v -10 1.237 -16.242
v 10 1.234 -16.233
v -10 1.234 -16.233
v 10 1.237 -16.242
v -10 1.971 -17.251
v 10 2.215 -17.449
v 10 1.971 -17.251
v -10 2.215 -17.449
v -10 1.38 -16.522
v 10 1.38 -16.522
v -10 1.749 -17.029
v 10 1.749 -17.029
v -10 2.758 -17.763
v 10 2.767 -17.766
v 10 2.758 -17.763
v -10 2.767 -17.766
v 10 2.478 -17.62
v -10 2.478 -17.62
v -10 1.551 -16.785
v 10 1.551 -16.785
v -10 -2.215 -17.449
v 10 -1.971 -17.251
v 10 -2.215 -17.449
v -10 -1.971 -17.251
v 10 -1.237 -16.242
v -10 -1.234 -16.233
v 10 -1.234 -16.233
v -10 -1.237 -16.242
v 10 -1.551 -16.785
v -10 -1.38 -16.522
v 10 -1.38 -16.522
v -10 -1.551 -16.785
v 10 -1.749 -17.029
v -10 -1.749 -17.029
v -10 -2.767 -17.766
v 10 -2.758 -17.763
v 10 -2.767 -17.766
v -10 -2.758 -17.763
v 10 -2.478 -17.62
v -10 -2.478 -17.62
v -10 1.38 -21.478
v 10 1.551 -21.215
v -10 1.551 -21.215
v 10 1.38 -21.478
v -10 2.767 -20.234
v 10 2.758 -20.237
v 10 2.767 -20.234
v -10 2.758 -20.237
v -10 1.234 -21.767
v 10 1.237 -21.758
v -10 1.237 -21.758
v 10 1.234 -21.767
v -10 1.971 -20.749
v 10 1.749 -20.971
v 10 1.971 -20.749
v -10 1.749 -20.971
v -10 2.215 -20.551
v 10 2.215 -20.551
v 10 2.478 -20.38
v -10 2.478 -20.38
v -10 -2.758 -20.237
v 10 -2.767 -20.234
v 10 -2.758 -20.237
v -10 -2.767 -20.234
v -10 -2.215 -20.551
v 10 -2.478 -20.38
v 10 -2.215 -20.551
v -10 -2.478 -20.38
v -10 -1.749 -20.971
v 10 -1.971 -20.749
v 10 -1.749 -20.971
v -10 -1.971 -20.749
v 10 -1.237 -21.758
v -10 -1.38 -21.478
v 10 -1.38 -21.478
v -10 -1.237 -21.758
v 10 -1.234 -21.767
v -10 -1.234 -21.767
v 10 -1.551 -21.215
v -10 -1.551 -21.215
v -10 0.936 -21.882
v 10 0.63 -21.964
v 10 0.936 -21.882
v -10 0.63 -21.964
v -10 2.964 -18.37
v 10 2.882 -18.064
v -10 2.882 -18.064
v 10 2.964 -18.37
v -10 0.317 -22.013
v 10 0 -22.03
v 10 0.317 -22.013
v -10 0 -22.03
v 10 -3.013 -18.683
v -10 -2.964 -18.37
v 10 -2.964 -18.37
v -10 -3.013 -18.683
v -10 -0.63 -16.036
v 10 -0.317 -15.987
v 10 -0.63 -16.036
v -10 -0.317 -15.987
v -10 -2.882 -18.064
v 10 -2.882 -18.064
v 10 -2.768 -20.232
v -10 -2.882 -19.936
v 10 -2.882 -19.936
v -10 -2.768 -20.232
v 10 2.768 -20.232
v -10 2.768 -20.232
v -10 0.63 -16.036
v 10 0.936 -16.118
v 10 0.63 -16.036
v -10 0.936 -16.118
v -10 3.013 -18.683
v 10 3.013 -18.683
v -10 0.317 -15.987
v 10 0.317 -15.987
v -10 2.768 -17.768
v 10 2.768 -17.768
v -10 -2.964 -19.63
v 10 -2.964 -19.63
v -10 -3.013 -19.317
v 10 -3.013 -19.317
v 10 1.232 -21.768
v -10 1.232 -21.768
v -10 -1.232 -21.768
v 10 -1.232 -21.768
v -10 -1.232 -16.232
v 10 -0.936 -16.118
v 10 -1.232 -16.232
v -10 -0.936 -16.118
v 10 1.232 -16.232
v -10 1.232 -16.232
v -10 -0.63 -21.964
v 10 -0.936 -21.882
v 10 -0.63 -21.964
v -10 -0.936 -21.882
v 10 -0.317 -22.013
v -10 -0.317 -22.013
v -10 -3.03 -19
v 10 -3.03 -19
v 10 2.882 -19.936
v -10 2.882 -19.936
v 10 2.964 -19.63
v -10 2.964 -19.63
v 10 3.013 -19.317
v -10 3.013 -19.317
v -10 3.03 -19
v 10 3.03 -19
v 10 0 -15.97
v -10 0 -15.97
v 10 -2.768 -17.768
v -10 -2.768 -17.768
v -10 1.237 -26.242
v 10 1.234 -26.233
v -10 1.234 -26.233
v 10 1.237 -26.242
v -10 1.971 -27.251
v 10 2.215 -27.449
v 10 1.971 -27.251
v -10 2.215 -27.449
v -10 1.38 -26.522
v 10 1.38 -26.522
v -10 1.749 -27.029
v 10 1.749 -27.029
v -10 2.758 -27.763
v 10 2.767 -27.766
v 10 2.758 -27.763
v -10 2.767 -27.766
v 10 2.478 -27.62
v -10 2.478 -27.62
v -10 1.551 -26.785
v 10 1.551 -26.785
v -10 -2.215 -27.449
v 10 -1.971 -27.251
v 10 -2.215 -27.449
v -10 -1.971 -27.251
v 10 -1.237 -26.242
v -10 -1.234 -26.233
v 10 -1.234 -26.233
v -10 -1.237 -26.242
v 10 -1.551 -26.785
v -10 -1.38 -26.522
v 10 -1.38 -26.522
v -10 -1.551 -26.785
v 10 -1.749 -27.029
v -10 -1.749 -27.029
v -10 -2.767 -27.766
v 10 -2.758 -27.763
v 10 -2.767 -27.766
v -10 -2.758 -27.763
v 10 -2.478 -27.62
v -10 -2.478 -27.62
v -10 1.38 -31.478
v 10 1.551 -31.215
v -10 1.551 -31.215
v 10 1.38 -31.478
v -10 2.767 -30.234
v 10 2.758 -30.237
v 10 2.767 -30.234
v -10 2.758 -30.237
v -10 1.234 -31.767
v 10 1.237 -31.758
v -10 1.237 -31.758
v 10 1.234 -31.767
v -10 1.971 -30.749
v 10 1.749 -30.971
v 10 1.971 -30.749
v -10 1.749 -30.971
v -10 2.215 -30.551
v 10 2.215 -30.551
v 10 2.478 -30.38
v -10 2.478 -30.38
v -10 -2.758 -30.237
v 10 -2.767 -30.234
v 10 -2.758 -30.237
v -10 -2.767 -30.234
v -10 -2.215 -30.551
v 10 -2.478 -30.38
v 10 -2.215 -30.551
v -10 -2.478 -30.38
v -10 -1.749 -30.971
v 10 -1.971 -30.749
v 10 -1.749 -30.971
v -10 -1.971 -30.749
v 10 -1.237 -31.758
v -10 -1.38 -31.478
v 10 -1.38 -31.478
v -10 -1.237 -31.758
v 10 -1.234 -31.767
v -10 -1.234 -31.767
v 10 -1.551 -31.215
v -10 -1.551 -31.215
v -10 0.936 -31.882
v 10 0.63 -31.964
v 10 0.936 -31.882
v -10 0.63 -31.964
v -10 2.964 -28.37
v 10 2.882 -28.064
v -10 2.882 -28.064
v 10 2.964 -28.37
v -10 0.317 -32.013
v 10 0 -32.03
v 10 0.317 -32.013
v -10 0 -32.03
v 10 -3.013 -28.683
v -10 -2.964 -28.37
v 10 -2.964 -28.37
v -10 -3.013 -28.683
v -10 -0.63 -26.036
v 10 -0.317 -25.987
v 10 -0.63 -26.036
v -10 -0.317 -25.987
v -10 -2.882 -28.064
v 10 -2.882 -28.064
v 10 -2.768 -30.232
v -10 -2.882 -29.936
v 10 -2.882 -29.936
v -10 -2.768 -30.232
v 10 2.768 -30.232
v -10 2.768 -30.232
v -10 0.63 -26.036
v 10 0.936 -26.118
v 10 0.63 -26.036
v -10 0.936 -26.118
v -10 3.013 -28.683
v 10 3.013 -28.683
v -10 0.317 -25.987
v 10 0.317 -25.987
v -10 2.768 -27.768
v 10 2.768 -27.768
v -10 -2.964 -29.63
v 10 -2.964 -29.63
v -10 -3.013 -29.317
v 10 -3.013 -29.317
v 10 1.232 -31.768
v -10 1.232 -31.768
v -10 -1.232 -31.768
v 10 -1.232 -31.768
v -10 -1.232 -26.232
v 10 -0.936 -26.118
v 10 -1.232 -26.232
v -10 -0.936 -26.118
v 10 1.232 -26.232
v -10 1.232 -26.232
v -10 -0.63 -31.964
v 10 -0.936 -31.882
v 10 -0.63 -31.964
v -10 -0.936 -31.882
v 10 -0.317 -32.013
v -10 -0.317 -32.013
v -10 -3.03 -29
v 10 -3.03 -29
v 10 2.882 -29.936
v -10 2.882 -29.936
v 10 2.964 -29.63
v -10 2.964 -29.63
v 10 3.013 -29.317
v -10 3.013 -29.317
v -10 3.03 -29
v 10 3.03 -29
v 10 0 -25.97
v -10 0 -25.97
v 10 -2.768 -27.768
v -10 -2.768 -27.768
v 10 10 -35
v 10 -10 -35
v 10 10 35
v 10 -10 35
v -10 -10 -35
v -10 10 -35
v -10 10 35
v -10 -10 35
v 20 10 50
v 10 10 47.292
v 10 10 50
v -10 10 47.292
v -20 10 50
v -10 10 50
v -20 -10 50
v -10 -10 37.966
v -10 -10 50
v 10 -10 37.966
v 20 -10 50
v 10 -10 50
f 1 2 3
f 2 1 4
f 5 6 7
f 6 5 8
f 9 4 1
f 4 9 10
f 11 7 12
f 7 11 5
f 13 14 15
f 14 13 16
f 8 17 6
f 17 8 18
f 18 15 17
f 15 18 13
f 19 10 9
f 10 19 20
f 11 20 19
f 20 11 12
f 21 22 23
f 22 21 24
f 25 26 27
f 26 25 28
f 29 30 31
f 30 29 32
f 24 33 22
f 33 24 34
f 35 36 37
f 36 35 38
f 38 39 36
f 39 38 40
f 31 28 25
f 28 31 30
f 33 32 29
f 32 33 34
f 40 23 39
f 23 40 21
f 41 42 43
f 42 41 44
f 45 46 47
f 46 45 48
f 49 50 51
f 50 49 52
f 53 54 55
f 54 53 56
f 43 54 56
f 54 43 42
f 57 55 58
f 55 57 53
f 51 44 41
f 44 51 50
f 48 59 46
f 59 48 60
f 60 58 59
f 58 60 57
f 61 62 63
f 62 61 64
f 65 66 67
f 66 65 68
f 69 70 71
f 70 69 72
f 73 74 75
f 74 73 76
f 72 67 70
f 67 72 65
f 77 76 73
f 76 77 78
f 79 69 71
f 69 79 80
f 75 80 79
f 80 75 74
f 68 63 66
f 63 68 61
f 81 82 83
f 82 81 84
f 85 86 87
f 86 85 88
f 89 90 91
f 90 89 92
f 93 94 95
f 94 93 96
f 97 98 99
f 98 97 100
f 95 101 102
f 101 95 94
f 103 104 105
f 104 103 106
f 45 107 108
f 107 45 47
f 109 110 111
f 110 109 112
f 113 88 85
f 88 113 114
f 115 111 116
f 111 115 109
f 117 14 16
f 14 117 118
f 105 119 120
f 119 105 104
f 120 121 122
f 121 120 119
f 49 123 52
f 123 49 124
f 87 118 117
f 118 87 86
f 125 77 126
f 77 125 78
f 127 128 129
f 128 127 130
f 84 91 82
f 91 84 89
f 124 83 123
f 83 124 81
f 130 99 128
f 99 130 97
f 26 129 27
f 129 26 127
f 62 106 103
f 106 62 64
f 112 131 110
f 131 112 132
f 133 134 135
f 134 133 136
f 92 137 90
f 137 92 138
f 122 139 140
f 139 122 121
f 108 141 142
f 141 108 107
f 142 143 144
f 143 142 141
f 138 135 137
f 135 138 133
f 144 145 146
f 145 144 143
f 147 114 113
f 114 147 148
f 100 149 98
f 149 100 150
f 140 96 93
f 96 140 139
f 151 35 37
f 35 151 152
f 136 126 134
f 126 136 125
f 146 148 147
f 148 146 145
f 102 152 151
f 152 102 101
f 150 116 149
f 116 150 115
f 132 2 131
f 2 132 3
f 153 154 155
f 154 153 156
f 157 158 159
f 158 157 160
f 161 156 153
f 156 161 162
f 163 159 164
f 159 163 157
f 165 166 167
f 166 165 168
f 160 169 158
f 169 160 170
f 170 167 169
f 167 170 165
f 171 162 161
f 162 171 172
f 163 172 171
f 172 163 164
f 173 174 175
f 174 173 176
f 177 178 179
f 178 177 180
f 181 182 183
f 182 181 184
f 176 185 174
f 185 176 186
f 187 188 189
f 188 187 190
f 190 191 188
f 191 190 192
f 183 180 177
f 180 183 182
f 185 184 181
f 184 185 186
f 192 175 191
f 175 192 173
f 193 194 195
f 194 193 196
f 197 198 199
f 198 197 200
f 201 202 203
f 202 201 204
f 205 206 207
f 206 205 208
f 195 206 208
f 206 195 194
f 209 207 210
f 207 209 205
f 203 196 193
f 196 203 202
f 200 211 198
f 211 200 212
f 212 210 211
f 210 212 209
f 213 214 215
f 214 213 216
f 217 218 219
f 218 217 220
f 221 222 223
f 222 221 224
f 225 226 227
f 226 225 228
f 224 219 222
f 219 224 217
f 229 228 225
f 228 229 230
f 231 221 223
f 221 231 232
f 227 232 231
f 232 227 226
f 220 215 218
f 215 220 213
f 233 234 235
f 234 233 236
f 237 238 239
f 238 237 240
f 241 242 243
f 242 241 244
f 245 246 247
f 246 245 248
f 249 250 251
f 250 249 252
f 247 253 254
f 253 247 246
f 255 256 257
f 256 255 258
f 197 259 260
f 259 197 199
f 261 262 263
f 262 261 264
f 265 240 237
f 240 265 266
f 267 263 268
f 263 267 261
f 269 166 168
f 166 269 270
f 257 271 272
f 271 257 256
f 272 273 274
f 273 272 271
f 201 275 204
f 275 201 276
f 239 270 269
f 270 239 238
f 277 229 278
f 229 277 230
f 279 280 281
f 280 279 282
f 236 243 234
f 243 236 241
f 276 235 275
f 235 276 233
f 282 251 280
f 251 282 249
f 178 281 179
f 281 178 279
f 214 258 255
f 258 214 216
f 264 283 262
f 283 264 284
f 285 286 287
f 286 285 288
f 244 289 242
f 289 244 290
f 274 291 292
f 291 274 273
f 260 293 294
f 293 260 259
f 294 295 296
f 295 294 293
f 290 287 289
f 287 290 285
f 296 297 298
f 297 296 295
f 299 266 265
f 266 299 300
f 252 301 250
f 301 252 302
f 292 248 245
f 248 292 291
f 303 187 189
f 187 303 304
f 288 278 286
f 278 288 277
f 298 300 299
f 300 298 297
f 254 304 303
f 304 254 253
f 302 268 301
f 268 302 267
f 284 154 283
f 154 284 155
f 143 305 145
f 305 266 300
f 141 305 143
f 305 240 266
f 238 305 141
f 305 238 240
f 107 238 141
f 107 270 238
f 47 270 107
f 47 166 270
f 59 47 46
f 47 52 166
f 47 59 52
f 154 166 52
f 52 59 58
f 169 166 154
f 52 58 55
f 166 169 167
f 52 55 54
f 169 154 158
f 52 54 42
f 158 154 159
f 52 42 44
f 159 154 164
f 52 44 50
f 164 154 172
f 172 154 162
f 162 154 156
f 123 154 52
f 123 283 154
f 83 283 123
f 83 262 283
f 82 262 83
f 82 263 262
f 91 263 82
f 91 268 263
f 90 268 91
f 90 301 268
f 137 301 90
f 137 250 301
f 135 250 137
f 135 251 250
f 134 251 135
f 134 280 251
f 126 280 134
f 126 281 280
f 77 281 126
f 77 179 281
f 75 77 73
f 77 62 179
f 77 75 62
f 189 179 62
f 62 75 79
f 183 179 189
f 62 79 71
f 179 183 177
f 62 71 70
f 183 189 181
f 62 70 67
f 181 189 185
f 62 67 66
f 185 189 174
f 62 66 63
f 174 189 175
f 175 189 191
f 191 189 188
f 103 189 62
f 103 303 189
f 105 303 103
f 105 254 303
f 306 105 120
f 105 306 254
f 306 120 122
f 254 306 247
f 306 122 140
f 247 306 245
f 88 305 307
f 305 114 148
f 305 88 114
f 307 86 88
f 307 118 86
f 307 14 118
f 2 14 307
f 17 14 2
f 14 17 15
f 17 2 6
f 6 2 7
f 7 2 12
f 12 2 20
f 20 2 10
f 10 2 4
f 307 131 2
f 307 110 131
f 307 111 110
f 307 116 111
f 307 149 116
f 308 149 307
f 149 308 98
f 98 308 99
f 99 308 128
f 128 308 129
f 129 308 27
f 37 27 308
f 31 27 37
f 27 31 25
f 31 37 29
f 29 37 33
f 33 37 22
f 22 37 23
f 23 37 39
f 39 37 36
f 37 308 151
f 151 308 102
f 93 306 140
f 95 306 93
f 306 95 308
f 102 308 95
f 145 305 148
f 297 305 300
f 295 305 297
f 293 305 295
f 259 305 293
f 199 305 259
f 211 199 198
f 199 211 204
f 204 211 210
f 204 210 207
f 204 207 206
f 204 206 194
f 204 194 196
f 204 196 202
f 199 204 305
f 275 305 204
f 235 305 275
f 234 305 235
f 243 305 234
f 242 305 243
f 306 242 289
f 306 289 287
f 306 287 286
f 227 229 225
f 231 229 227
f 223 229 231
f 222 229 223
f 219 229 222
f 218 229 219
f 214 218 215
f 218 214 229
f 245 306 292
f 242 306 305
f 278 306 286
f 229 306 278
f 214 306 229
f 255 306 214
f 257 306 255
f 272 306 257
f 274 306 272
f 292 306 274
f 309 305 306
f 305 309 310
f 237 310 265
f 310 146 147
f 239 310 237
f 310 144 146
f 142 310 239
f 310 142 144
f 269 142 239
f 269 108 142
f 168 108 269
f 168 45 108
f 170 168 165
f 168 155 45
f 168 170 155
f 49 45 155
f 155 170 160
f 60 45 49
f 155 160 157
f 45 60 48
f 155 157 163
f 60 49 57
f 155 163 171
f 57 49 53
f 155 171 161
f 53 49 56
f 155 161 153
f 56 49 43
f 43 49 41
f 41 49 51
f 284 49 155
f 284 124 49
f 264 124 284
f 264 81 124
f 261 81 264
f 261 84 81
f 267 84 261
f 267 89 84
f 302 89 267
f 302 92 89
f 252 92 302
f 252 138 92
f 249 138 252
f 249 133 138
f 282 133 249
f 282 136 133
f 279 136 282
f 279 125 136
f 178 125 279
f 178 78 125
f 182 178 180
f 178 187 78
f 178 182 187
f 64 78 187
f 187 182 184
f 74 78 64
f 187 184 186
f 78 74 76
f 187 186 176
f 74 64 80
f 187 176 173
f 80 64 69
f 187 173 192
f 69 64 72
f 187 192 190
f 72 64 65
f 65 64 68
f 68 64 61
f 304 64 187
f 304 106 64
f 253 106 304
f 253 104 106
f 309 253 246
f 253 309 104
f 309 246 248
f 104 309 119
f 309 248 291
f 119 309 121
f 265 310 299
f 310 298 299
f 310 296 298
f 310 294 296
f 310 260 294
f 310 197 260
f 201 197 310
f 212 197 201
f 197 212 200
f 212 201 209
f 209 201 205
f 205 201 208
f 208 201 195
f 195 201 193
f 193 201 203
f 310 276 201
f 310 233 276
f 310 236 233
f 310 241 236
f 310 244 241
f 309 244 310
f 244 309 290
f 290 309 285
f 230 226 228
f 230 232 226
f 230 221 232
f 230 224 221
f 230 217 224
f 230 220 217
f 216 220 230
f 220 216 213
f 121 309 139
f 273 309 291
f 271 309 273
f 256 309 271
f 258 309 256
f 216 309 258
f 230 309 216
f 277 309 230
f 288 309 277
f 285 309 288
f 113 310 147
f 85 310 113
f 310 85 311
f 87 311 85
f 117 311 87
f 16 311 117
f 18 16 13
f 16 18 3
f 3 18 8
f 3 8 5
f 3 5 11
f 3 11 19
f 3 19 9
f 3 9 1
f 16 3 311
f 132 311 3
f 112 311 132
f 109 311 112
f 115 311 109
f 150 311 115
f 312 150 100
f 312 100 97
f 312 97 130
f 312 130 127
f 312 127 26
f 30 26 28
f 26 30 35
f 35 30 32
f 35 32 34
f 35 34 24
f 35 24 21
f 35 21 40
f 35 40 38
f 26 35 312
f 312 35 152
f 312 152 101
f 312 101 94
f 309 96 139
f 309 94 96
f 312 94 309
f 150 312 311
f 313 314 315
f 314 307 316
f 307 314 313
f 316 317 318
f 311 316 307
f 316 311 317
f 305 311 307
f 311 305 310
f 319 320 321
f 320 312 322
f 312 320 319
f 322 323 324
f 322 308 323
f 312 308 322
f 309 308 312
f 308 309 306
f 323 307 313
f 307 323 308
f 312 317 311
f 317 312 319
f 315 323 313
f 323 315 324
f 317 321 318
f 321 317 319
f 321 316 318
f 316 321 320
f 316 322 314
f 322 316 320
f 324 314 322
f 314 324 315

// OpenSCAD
//cube dimensions


// ---------------CHANGEABLE VARIABLES---------------
//Step head
step_height = 15;
step_width = 20;
step_number = 4;
step_inc_height = 10;   

step_increasement = (step_number-1)*step_inc_height;

B = 40;
b = 20;

//Cube
cube_height = 40;

// ---------------STATIC VARIABLES---------------
$fn = 100;
make_lowerpart(step_width,step_width,cube_height);

module small_bar(c, x_offset, y_offset, z_offset, length, rotation, hole){
    difference(){
        // Checking if the radius should be a for a hole or a bar
        // radius = hole ? joint_bar_r*1.05 : joint_bar_r; // ORIGINAL
        radius = hole ? 3*1.01 : 3; // THIGHTER
        
        // Making the main bar
        translate([x_offset, y_offset, z_offset])
            color(c)rotate(a = rotation)cylinder(r=radius, h=length, $fn=60, center=true);
        
        // Checking which axis the indents should be along, 
        // and sending is as the offset_push variable when making the indents in the bar.
        if(rotation[0] == 0 && rotation[1] == 0){
            indents(c, x_offset, y_offset, z_offset, length, rotation, hole, offset_push=[1,2,0]);
        } else if(rotation[0] == rotation[2]){
            indents(c, x_offset, y_offset, z_offset, length, rotation, hole, offset_push=[0,1,2]);
        } else {
            indents(c, x_offset, y_offset, z_offset, length, rotation, hole, offset_push=[1,0,2]);
        }
    }
}

module indents(c, x_offset, y_offset, z_offset, length, rotation, hole, offset_push){
    // The Indents on the side
    indent_dis = hole ? 3*1.3*1.02 : 3*1.3;
    k = indent_dis;
    x_push = offset_push[0];
    y_push = offset_push[1];
    z_push = offset_push[2];
    for(j = [[0,k,k],[0,-k,k],[0,k,-k],[0,-k,-k]]){
        translate([x_offset+j[x_push], y_offset+j[y_push], z_offset+j[z_push]])
        color(c)rotate(a = rotation)cylinder(r=3, h=length*2, $fn=60, center=true);
    }
}


module make_lowerpart(cube_lengthX,cube_widthY,cube_heightZ){
    difference(){
        //Making the buttom cube
        cube([cube_lengthX,cube_widthY,cube_heightZ+step_increasement], center=true);
    
        //making the hole in buttomsection
        translate([0,0,-(cube_heightZ/2)+16-step_increasement/2])
            small_bar("yellow", 0, 0, 0, 40, [0,90,0], hole = true);
        
        //making the hole in buttomsection
        translate([0,0,-(cube_heightZ/2)+6-step_increasement/2])
            small_bar("yellow", 0, 0, 0, 40, [0,90,0], hole = true);
    } 
    
 difference(){
    //making the head
    translate([0,0,cube_heightZ/2+step_height/2+step_increasement/2])
        rotate([270,0,0])
            linear_extrude(height = cube_lengthX,center=true)
                polygon (points = [
                    [-B/2, -step_height/2],
                    [-b/2, step_height/2],
                    [b/2, step_height/2],
                    [B/2, -step_height/2]
                ]); 

    translate([0,-cube_widthY/2,cube_heightZ-6+step_increasement/2])
        rotate([25,0,0])
            cube([cube_lengthX,cube_widthY+20,20], center=true);
 }
}



// ---------------OTHER PARTS---------------

//making the body cylinder
    //translate([cube_lengthX/2,0,cube_heightZ-5])
        //color("green")cylinder(20,cube_widthY/2,cube_widthY/2);
